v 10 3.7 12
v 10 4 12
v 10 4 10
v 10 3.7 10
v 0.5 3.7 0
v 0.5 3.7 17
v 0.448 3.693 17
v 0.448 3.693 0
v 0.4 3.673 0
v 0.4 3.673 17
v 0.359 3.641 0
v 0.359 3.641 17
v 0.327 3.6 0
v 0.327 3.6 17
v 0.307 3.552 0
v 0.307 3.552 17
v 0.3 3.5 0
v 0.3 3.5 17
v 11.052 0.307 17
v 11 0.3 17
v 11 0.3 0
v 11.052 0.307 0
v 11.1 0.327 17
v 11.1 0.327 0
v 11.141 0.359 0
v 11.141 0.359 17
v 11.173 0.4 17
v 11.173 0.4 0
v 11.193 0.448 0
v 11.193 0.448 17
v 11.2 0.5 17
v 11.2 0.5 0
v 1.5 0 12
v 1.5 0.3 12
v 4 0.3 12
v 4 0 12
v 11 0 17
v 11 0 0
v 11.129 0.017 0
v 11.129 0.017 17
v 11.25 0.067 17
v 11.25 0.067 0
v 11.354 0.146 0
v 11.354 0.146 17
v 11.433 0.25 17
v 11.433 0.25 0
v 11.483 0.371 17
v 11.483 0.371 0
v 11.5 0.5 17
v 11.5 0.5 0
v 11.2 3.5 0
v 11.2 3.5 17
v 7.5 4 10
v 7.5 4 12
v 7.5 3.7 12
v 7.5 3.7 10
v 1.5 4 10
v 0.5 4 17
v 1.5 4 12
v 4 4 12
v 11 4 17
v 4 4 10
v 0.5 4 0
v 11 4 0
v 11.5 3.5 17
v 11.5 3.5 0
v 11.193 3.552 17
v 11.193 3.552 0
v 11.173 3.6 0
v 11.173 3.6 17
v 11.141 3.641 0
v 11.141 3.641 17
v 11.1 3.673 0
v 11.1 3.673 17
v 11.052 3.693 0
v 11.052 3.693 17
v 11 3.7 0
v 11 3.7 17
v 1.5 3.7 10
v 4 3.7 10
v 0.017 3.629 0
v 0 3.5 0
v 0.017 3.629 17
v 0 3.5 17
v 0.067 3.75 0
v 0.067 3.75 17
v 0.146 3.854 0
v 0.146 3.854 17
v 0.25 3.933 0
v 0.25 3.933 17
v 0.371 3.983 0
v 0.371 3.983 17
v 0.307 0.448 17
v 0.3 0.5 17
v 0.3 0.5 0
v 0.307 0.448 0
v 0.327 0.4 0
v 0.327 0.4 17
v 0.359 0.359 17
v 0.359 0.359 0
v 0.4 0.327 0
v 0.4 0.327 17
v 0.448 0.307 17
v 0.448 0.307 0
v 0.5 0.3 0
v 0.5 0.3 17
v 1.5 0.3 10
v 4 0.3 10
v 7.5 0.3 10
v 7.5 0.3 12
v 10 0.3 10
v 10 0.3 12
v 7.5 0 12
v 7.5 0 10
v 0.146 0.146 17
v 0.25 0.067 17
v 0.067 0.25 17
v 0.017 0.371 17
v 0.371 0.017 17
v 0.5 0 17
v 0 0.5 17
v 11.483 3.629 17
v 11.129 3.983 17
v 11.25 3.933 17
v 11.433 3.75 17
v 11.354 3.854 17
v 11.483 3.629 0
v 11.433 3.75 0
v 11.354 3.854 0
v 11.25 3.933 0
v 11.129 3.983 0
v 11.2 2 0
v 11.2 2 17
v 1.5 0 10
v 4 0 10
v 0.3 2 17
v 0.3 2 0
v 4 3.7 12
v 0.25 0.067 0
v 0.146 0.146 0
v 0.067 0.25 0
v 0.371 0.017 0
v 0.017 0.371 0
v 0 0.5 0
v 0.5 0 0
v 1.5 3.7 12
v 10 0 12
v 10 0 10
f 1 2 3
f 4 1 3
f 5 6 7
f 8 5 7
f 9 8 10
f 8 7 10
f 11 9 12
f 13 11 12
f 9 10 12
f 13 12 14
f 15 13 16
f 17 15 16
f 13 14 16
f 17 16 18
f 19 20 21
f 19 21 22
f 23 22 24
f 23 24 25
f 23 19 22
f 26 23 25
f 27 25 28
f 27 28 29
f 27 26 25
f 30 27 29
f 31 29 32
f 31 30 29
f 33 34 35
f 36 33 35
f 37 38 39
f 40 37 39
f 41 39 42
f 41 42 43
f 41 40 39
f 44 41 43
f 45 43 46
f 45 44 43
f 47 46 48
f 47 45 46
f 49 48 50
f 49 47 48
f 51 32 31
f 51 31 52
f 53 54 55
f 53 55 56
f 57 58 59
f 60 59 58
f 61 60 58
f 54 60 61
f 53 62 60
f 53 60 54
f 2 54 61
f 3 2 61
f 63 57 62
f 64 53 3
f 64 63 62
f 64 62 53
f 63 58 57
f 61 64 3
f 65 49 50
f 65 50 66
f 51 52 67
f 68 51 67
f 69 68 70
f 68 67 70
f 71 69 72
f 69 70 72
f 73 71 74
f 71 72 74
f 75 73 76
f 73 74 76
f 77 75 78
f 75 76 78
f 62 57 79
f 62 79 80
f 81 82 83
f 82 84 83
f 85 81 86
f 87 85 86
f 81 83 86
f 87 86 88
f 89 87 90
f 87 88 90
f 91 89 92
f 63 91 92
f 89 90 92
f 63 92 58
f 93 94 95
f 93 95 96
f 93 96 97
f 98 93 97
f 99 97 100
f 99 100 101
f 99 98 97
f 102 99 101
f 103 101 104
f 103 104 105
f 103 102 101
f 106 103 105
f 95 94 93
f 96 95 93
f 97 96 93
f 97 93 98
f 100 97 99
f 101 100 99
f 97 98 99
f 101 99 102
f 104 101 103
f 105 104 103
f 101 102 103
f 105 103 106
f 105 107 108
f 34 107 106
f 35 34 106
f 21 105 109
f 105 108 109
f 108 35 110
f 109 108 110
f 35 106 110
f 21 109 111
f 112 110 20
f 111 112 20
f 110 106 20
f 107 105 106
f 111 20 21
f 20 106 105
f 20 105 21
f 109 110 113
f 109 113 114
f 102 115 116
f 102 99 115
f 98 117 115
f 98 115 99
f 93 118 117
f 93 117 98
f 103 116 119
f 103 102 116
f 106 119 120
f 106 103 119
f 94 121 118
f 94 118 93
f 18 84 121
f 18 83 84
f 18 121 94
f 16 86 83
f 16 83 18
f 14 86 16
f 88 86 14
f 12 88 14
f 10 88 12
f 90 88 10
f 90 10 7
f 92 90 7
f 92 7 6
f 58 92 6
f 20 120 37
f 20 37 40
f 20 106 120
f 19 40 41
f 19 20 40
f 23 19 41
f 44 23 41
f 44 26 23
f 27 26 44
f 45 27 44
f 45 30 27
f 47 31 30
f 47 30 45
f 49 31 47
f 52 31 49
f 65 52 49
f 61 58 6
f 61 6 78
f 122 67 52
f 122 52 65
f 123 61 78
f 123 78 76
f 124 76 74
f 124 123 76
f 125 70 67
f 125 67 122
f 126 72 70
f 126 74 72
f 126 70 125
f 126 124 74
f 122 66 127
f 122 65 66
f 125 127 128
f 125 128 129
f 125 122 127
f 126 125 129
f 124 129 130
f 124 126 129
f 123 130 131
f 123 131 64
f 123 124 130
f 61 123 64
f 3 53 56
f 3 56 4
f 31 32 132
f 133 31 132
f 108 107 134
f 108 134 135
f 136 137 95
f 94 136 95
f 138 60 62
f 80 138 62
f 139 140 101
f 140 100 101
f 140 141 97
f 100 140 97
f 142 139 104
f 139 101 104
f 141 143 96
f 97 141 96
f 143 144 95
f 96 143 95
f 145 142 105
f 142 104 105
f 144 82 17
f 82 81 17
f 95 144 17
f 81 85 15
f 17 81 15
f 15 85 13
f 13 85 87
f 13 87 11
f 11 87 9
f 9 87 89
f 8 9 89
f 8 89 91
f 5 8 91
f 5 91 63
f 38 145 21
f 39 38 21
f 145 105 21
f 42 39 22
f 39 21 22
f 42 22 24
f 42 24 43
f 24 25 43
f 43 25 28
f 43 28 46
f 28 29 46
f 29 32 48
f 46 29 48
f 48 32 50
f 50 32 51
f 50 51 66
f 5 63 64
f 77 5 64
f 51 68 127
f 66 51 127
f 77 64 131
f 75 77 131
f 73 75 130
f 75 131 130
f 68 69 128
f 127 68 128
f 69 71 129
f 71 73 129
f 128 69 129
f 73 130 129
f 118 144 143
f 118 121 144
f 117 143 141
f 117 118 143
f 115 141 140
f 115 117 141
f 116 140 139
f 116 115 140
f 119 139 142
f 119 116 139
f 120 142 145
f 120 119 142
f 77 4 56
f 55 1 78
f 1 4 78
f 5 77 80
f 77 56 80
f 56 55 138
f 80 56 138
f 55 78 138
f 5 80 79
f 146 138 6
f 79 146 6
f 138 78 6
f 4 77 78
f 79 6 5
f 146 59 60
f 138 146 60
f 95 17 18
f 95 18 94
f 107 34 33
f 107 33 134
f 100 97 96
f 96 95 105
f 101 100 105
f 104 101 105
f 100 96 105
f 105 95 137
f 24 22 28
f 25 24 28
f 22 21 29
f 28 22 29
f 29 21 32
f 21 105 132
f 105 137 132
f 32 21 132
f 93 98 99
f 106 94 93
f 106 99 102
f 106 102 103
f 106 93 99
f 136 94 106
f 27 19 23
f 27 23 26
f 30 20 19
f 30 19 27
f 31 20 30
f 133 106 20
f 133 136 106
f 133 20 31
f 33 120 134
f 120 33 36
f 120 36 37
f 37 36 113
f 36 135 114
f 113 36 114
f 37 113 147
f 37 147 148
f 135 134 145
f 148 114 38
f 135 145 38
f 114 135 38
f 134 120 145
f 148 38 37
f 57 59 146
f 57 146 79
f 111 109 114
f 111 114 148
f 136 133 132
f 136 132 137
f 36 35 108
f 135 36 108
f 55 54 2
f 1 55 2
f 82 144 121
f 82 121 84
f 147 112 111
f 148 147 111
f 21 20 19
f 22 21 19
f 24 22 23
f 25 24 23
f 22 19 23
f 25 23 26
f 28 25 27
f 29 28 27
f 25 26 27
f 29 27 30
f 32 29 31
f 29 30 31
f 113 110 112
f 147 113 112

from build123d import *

# Parameters (mm, degrees)
SKETCH_1_W          = 11.5
SKETCH_1_H          = 4
EXTRUDE_1_DEPTH     = 17
FILLET_1_R          = 0.5
CUT_EXTRUDE_1_DEPTH = 18
SKETCH_4_W          = 2.5
SKETCH_4_H          = 2
CUT_EXTRUDE_2_DEPTH = 5
EXTRUDE_2_DEPTH     = 17


with BuildPart() as part:
    # Эскиз1 → Вытянуть1 (new body)
    with BuildSketch(Plane.XY):
        with Locations((5.75, 2)):
            Rectangle(SKETCH_1_W, SKETCH_1_H)
    extrude(amount=EXTRUDE_1_DEPTH)

    # Скругление1
    fillet_1_edges = [part.edges().sort_by_distance(p)[0] for p in [
        (0, 4, 8.5),
        (11.5, 4, 8.5),
        (11.5, 0, 8.5),
        (0, 0, 8.5),
    ]]
    fillet(fillet_1_edges, radius=FILLET_1_R)

    # Эскиз2 → Вырез-Вытянуть1 (cut, through all)
    with BuildSketch(Plane.XY.offset(17)):
        with BuildLine():
            Line((11.2, 0.5), (11.2, 3.5))
            ThreePointArc((11.2, 3.5), (11.141421356, 3.641421356), (11, 3.7))
            Line((11, 3.7), (0.5, 3.7))
            ThreePointArc((0.5, 3.7), (0.358578644, 3.641421356), (0.3, 3.5))
            Line((0.3, 3.5), (0.3, 0.5))
            ThreePointArc((0.3, 0.5), (0.358578644, 0.358578644), (0.5, 0.3))
            Line((0.5, 0.3), (11, 0.3))
            ThreePointArc((11, 0.3), (11.141421356, 0.358578644), (11.2, 0.5))
        make_face()
    extrude(amount=-CUT_EXTRUDE_1_DEPTH, mode=Mode.SUBTRACT)

    # Эскиз4 → Вырез-Вытянуть2 (cut, through all)
    with BuildSketch(Plane(origin=(0, 4, 0), x_dir=(1, 0, 0), z_dir=(0, 1, 0))):
        with Locations((2.75, -11)):
            Rectangle(SKETCH_4_W, SKETCH_4_H)
        with Locations((8.75, -11)):
            Rectangle(SKETCH_4_W, SKETCH_4_H)
    extrude(amount=-CUT_EXTRUDE_2_DEPTH, mode=Mode.SUBTRACT)


with BuildPart() as body_2:
    # Эскиз3 → Вытянуть2 (new body, through all)
    with BuildSketch(Plane.XY.offset(17)):
        with BuildLine():
            Line((11.2, 0.5), (11.2, 2))
            Line((11.2, 2), (0.3, 2))
            Line((0.3, 2), (0.3, 0.5))
            ThreePointArc((0.3, 0.5), (0.358578644, 0.358578644), (0.5, 0.3))
            Line((0.5, 0.3), (11, 0.3))
            ThreePointArc((11, 0.3), (11.141421356, 0.358578644), (11.2, 0.5))
        make_face()
    extrude(amount=-EXTRUDE_2_DEPTH)


solid = Compound([part.part, body_2.part])
